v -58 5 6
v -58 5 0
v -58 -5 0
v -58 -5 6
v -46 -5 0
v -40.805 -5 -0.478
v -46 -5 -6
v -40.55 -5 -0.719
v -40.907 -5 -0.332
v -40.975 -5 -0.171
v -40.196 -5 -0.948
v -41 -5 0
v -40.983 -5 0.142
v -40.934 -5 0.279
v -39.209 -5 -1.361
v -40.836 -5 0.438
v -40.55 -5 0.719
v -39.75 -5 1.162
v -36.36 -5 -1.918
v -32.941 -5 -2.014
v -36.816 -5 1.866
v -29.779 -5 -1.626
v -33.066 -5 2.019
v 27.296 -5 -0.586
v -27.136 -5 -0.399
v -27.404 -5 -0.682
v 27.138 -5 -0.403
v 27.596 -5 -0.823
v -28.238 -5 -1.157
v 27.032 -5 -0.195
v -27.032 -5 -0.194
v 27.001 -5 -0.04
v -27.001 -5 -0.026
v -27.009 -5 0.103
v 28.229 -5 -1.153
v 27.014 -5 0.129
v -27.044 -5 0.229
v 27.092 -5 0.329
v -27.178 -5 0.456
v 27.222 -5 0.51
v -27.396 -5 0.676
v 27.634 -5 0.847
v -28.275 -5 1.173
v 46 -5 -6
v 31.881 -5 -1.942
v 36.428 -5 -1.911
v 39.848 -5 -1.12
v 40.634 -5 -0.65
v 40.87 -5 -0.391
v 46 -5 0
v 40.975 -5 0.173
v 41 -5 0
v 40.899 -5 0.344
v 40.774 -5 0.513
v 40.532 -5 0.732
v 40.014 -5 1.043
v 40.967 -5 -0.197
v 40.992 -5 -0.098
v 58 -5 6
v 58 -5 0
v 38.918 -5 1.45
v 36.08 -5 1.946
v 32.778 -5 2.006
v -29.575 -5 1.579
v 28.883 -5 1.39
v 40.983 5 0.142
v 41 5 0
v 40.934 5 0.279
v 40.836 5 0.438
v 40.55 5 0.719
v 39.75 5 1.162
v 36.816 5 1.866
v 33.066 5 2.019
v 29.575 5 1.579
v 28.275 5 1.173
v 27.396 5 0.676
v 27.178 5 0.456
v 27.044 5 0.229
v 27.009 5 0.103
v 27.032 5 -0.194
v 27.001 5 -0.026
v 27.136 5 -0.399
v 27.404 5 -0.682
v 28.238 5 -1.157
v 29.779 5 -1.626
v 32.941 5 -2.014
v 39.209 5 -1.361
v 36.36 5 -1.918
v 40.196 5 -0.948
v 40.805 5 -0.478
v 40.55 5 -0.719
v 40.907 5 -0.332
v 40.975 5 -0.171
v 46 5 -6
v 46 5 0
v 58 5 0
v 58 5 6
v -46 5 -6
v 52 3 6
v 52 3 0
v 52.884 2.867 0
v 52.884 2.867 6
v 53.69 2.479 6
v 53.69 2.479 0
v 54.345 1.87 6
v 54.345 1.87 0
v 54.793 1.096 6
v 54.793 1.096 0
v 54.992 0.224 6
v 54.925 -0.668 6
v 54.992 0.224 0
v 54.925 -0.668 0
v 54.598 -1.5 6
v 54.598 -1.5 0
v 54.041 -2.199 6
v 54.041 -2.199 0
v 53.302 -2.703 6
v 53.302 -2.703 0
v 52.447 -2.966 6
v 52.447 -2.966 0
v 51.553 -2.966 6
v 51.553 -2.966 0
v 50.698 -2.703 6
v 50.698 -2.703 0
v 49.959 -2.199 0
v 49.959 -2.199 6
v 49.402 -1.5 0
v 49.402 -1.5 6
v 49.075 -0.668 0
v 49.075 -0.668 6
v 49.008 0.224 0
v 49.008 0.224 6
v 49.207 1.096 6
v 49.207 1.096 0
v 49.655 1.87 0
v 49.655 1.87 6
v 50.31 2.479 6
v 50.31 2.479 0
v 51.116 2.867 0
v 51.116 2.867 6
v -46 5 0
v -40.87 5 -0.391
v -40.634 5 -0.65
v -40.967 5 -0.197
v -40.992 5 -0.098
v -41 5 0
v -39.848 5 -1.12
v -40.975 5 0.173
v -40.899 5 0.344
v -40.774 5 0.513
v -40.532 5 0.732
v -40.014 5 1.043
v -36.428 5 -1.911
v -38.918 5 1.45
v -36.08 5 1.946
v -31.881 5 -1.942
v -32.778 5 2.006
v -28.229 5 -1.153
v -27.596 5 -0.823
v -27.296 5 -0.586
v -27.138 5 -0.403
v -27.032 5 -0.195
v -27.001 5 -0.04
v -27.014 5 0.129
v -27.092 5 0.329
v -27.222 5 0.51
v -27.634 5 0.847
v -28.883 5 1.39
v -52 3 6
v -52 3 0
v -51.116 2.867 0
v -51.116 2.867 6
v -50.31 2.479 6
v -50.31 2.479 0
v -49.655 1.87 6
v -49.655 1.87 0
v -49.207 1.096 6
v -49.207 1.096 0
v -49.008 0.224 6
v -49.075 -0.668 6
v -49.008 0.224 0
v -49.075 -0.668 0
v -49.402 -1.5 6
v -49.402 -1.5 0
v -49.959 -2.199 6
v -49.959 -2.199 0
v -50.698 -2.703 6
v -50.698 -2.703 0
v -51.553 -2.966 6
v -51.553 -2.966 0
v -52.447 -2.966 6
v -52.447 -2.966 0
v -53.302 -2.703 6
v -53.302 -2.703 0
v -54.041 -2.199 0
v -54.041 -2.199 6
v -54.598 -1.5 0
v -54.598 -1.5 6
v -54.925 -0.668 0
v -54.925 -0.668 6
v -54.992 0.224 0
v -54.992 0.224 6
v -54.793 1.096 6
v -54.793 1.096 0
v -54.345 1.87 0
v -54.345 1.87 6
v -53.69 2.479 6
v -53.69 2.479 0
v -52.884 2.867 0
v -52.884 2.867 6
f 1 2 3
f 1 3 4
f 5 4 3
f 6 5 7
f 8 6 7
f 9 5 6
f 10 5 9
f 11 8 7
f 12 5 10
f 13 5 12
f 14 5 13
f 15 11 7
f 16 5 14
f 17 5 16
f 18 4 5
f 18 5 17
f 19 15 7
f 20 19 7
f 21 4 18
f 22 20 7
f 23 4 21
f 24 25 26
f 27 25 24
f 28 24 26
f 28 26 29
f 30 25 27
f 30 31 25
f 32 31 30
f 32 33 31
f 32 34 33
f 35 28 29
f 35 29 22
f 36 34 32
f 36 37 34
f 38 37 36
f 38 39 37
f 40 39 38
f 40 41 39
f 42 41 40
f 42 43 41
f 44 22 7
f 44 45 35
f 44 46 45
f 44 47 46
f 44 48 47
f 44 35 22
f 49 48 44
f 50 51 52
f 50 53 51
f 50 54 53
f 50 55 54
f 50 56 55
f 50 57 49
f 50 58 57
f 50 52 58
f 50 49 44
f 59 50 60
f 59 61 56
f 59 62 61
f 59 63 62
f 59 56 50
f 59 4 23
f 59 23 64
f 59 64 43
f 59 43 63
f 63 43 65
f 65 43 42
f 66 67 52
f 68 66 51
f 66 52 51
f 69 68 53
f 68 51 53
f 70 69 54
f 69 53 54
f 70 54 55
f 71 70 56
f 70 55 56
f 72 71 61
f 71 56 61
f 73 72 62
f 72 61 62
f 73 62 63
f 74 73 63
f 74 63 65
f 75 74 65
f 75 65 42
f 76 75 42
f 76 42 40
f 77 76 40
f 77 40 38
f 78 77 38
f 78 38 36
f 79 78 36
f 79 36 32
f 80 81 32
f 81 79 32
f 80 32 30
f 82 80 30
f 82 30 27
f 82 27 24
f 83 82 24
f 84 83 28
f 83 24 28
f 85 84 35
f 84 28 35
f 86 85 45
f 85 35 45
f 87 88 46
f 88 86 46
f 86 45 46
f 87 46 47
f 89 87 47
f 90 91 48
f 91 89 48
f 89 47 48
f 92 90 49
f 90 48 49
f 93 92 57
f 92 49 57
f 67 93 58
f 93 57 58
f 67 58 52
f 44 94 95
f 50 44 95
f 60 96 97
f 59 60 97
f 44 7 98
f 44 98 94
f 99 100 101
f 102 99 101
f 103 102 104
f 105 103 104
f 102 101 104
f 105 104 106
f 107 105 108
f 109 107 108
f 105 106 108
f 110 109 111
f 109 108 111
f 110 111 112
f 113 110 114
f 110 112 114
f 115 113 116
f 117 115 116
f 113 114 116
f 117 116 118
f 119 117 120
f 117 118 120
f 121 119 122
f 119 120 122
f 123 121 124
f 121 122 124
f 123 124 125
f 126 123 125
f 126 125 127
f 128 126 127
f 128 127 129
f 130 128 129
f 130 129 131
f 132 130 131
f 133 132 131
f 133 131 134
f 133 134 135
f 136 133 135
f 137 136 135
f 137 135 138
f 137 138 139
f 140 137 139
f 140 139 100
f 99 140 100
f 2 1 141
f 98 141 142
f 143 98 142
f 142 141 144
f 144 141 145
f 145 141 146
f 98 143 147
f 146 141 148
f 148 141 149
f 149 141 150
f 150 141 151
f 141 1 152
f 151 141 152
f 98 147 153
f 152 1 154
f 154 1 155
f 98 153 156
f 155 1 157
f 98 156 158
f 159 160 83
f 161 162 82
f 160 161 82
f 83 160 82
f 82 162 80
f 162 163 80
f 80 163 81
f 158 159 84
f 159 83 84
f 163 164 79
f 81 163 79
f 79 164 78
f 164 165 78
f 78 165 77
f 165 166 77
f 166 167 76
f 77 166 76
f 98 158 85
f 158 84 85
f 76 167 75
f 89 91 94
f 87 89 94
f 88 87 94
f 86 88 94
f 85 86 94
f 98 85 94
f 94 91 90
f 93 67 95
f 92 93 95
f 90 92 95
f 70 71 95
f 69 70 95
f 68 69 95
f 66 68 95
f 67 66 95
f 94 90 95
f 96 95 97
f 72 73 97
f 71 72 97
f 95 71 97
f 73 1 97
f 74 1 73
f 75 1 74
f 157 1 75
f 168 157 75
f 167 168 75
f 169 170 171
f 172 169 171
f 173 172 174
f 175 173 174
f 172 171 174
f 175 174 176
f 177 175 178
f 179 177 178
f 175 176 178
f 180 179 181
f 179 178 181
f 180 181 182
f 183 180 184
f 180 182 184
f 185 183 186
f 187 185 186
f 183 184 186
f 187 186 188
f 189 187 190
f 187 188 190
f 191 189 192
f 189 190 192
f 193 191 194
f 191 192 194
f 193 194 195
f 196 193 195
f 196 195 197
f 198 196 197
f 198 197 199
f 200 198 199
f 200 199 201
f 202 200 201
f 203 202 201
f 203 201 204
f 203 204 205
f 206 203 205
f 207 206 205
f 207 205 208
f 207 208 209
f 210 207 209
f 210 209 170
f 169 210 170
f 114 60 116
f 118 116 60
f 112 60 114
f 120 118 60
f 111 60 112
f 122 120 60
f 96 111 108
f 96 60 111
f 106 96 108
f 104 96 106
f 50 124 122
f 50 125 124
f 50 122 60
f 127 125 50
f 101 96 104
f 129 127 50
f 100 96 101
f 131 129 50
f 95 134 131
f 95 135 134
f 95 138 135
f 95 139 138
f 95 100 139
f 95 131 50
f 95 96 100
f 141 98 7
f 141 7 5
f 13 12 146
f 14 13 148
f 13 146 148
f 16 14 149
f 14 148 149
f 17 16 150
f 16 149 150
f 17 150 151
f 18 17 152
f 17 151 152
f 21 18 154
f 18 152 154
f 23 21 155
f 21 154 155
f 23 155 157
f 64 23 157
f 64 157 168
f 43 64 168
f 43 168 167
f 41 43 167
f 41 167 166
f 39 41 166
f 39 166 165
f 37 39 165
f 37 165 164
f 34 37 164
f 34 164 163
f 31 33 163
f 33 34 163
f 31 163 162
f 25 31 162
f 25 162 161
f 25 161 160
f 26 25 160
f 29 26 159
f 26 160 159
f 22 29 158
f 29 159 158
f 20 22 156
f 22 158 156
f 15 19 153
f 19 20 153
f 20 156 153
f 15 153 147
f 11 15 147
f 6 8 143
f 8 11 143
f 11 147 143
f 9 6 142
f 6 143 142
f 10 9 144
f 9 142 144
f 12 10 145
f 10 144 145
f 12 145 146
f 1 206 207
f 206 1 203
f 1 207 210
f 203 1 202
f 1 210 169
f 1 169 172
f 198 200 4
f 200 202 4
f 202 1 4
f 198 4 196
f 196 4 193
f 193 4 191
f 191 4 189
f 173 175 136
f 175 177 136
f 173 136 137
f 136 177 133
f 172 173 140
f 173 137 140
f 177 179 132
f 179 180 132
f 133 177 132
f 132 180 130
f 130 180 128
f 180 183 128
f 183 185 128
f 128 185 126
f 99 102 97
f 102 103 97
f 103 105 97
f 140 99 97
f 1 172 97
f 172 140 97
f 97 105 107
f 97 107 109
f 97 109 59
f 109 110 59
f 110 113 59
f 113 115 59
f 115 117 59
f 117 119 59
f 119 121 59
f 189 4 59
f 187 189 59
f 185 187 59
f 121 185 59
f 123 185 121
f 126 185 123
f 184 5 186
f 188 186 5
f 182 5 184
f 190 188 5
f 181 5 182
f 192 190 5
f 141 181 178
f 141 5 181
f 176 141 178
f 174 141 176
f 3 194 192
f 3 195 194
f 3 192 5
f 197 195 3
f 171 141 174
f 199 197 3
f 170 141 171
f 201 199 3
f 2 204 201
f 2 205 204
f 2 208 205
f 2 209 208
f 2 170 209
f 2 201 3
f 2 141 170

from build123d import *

# Parameters (mm, degrees)
SKETCH1_W           = 116
SKETCH1_H           = 12
BOSS_EXTRUDE1_DEPTH = 10
SKETCH2_W           = 12
SKETCH2_H           = 6
CUT_EXTRUDE1_DEPTH  = 60.160797831
SKETCH3_W           = 12
SKETCH3_H           = 6
CUT_EXTRUDE2_DEPTH  = 60.160797831
SKETCH4_RX          = 7
SKETCH4_RY          = 2.03764
CUT_EXTRUDE3_DEPTH  = 60.160797831
SKETCH5_R           = 3.000001601
CUT_EXTRUDE4_DEPTH  = 59.523499671
SKETCH6_R           = 3.000001601
CUT_EXTRUDE5_DEPTH  = 59.523499671
SKETCH7_RX          = 7
SKETCH7_RY          = 2.03764
CUT_EXTRUDE6_DEPTH  = 60.160797956


with BuildPart() as part:
    # Sketch1 → Boss-Extrude1 (new body)
    with BuildSketch(Plane.XZ.offset(5)):
        Rectangle(SKETCH1_W, SKETCH1_H)
    extrude(amount=-BOSS_EXTRUDE1_DEPTH)

    # Sketch2 → Cut-Extrude1 (cut, through all)
    with BuildSketch(Plane(origin=(0, 5, 0), x_dir=(-1, 0, 0), z_dir=(0, 1, 0))):
        with Locations((52, -3)):
            Rectangle(SKETCH2_W, SKETCH2_H)
    extrude(amount=-CUT_EXTRUDE1_DEPTH, mode=Mode.SUBTRACT)

    # Sketch3 → Cut-Extrude2 (cut, through all)
    with BuildSketch(Plane(origin=(0, 5, 0), x_dir=(-1, 0, 0), z_dir=(0, 1, 0))):
        with Locations((-52, -3)):
            Rectangle(SKETCH3_W, SKETCH3_H)
    extrude(amount=-CUT_EXTRUDE2_DEPTH, mode=Mode.SUBTRACT)

    # Sketch4 → Cut-Extrude3 (cut, through all)
    with BuildSketch(Plane.XZ.offset(5)):
        with Locations((34, 0)):
            Ellipse(SKETCH4_RX, SKETCH4_RY)
    extrude(amount=-CUT_EXTRUDE3_DEPTH, mode=Mode.SUBTRACT)

    # Sketch5 → Cut-Extrude4 (cut, through all)
    with BuildSketch(Plane(origin=(0, 0, 0), x_dir=(-1, 0, 0), z_dir=(0, 0, -1))):
        with Locations(Location((52, 0, 0), (0, 0, 90))):
            Circle(SKETCH5_R)
    extrude(amount=-CUT_EXTRUDE4_DEPTH, mode=Mode.SUBTRACT)

    # Sketch6 → Cut-Extrude5 (cut, through all)
    with BuildSketch(Plane(origin=(0, 0, 0), x_dir=(-1, 0, 0), z_dir=(0, 0, -1))):
        with Locations(Location((-52, 0, 0), (0, 0, 90))):
            Circle(SKETCH6_R)
    extrude(amount=-CUT_EXTRUDE5_DEPTH, mode=Mode.SUBTRACT)

    # Sketch7 → Cut-Extrude6 (cut, through all)
    with BuildSketch(Plane(origin=(0, 5, 0), x_dir=(-1, 0, 0), z_dir=(0, 1, 0))):
        with Locations((34, 0)):
            Ellipse(SKETCH7_RX, SKETCH7_RY)
    extrude(amount=-CUT_EXTRUDE6_DEPTH, mode=Mode.SUBTRACT)


solid = part.part
